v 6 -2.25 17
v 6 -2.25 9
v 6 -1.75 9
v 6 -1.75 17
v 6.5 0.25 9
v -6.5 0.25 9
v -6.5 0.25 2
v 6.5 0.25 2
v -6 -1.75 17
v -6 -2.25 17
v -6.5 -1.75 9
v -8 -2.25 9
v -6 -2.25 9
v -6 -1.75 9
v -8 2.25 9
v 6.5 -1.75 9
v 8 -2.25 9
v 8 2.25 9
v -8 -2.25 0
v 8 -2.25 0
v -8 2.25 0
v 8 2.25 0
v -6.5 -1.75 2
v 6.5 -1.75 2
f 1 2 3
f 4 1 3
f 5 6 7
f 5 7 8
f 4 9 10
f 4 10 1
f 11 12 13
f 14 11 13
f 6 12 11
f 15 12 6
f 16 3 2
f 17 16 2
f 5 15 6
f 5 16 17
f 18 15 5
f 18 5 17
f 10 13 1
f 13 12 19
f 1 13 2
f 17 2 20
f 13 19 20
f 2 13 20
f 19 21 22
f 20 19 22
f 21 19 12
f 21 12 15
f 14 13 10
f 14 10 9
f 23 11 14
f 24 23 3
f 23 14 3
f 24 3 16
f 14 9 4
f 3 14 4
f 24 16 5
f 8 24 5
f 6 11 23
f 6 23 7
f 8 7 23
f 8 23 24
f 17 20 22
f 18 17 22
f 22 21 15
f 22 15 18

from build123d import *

# Parameters (mm, degrees)
F0_W     = 16
F0_H     = 4.5
F1_DEPTH = 9
F2_W     = 13
F2_H     = 2
F3_DEPTH = 7
F4_W     = 12
F4_H     = 0.5
F5_DEPTH = 8


with BuildPart() as f1:
    # F0 (on Top) → F1 (new body)
    with BuildSketch(Plane.XY):
        Rectangle(F0_W, F0_H)
    extrude(amount=F1_DEPTH)

    # F2 (on face) → F3 (cut)
    with BuildSketch(Plane.XY.offset(9)):
        with Locations((0, -0.75)):
            Rectangle(F2_W, F2_H)
    extrude(amount=-F3_DEPTH, mode=Mode.SUBTRACT)

    # F4 (on face) → F5 (join)
    with BuildSketch(Plane.XY.offset(9)):
        with Locations((0, -2)):
            Rectangle(F4_W, F4_H)
    extrude(amount=F5_DEPTH)


solid = f1.part
